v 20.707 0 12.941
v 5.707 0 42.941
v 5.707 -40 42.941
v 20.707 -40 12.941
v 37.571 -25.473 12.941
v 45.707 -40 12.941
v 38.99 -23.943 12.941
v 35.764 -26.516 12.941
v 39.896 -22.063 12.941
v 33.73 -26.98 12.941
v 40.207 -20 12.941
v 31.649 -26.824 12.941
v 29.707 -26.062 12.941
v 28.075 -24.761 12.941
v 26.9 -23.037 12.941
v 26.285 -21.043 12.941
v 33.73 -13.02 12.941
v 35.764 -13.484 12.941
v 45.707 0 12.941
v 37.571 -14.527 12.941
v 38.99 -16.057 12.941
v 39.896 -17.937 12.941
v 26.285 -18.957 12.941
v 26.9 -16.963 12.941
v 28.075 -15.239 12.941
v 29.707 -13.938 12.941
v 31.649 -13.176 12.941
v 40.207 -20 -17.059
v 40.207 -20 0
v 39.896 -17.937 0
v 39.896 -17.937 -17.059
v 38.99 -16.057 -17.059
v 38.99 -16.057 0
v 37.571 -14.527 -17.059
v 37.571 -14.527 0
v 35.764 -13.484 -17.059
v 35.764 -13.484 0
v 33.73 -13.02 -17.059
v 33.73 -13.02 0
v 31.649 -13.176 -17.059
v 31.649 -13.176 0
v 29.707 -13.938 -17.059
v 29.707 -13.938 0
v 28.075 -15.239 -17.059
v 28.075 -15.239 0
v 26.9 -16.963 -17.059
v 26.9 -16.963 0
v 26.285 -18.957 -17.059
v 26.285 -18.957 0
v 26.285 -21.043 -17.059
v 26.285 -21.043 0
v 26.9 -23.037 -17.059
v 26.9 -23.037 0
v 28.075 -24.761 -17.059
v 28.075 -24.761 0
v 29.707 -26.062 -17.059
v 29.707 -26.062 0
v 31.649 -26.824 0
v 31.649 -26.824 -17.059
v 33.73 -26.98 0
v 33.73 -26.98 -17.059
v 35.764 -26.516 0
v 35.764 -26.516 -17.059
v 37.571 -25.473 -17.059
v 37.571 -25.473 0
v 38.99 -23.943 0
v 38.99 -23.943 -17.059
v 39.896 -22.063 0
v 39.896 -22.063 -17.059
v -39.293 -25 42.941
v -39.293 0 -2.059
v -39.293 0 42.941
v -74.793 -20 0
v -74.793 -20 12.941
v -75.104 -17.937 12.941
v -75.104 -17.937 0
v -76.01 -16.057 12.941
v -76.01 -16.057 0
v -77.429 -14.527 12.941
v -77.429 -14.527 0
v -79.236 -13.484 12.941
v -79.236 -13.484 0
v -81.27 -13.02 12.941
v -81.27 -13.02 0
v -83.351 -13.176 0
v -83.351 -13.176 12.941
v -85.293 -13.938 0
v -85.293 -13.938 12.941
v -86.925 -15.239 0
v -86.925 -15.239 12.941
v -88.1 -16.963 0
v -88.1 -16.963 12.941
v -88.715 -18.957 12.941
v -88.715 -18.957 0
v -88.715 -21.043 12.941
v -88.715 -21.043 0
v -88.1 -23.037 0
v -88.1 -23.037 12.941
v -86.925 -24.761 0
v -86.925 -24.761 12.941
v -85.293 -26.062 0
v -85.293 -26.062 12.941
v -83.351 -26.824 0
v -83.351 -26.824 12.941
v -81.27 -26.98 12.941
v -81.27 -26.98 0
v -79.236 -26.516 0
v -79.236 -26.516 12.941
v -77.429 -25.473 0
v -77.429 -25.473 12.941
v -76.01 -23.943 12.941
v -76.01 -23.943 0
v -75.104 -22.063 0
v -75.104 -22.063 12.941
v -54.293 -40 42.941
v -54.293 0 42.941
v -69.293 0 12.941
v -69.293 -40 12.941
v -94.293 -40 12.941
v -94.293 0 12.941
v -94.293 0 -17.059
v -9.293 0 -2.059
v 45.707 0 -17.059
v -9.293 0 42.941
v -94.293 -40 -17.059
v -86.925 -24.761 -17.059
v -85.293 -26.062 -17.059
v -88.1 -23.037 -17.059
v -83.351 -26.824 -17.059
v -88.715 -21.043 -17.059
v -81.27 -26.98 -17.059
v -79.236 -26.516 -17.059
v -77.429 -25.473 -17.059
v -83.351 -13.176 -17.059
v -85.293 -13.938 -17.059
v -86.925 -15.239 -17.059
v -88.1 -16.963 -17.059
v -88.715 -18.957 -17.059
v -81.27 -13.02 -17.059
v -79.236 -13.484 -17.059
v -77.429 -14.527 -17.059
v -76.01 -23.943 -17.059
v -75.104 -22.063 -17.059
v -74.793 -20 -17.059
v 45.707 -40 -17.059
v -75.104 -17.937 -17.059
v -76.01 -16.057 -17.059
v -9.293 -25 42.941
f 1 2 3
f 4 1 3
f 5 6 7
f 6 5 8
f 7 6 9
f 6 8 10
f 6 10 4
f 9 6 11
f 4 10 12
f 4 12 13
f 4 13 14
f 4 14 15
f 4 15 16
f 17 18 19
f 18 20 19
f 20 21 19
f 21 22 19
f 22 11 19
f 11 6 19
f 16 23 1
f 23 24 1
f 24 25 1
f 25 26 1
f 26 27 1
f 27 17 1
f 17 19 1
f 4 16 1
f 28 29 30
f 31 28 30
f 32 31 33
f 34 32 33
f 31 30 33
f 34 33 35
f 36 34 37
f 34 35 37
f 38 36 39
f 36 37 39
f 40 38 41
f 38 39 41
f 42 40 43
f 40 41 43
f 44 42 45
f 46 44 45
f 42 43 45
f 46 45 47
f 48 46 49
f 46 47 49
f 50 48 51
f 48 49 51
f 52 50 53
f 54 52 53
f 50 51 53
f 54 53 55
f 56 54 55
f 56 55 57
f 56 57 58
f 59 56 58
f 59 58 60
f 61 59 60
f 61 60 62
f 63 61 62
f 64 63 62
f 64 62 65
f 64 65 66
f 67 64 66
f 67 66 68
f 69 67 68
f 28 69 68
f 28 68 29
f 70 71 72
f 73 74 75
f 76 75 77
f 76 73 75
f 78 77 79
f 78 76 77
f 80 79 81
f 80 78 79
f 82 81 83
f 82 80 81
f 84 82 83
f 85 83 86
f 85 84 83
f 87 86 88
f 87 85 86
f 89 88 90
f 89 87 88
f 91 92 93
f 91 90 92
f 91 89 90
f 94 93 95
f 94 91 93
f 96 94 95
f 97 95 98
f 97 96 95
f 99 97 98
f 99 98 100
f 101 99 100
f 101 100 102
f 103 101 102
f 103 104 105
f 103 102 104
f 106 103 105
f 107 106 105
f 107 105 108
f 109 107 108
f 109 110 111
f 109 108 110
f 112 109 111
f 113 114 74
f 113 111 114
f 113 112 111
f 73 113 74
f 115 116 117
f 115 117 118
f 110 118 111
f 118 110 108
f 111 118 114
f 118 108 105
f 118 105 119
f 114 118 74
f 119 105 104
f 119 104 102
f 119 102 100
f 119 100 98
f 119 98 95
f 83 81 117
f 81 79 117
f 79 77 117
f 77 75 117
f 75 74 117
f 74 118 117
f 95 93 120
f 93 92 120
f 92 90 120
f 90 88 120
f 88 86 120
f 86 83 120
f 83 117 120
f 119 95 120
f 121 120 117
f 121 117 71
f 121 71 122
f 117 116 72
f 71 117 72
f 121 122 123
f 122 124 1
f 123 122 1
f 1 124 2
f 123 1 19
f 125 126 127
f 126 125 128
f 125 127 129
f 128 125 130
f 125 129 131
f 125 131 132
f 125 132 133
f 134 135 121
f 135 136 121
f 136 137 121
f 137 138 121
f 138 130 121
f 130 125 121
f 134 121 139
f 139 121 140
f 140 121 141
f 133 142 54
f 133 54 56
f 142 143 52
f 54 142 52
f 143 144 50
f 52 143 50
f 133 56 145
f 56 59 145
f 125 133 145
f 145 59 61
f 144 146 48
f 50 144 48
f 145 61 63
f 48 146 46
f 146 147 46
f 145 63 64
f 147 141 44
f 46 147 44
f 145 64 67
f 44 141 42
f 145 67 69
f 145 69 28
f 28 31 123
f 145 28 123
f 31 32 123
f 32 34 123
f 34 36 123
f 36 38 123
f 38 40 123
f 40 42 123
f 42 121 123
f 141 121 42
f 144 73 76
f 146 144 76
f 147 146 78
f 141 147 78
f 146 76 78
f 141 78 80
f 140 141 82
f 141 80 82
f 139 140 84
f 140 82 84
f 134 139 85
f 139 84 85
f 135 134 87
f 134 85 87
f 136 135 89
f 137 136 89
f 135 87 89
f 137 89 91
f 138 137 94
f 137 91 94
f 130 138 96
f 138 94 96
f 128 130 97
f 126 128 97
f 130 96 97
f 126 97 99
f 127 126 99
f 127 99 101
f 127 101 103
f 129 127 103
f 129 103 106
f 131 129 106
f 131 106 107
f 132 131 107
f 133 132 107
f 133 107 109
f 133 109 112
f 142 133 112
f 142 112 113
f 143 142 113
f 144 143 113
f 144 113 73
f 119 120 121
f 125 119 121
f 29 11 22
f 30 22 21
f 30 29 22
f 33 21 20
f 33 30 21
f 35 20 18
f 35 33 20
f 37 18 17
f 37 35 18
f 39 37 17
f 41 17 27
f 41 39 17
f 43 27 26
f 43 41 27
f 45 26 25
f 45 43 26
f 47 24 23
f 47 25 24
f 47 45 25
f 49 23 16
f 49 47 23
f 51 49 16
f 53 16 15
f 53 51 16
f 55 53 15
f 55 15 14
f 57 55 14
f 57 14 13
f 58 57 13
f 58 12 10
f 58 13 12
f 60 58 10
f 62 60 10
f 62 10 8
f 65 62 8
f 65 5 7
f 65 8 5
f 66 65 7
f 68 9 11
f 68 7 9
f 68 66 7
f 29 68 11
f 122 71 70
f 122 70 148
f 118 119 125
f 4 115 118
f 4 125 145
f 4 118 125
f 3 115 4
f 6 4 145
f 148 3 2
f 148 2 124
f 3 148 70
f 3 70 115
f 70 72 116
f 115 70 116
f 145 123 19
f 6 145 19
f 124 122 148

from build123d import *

# Parameters (mm, degrees)
F1_DEPTH      = 40
F2_SIZE2      = 14.99999
F2_SIZE       = 29.99999
F2_2_SIZE2    = 14.99999
F2_2_SIZE     = 29.99999
F3_W          = 30
F3_H          = 45
F4_DEPTH      = 25
F5_SIZE2      = 24.99999
F5_SIZE       = 44.99999
F6_R          = 7
F7_DEPTH      = 15
F7_DEPTH_BACK = 20


# Not quite as in the source:
# - a fillet or chamfer is up to 0.001 mm smaller than in the source, because OpenCascade refuses the exact size


with BuildPart() as f1:
    # F0 (on Front) → F1 (new body)
    with BuildSketch(Plane.XZ):
        Polygon((20.7067526877, 42.941089198), (-69.2932473123, 42.941089198), (-69.2932473123, 12.941089198), (-94.2932473123, 12.941089198), (-94.2932473123, -17.058910802), (45.7067526877, -17.058910802), (45.7067526877, 12.941089198), (20.7067526877, 12.941089198), align=None)
    extrude(amount=F1_DEPTH)

    # F2 (size 30 and 15 in the source; OpenCascade refuses exactly that, so slightly less here)
    f2_edges = [f1.edges().sort_by_distance(p)[0] for p in [
        (-69.293247, -20, 42.941089),
    ]]
    f2_side = f1.faces().sort_by_distance((-69.293247, -20, 27.941089))[0]
    chamfer(f2_edges, length=F2_SIZE, length2=F2_SIZE2, reference=f2_side)

    # F2#2 (size 30 and 15 in the source; OpenCascade refuses exactly that, so slightly less here)
    f2_2_edges = [f1.edges().sort_by_distance(p)[0] for p in [
        (20.706753, -20, 42.941089),
    ]]
    f2_2_side = f1.faces().sort_by_distance((20.706753, -20, 27.941089))[0]
    chamfer(f2_2_edges, length=F2_2_SIZE, length2=F2_2_SIZE2, reference=f2_2_side)

    # F3 (on Front) → F4 (cut)
    with BuildSketch(Plane.XZ):
        with Locations((-24.2932473123, 20.441089198)):
            Rectangle(F3_W, F3_H)
    extrude(amount=F4_DEPTH, mode=Mode.SUBTRACT)

    # F5 (size 45 and 25 in the source; OpenCascade refuses exactly that, so slightly less here)
    f5_edges = [f1.edges().sort_by_distance(p)[0] for p in [
        (-24.293247, -25, -2.058911),
    ]]
    f5_side = f1.faces().sort_by_distance((-24.293247, -25, 20.441089))[0]
    chamfer(f5_edges, length=F5_SIZE, length2=F5_SIZE2, reference=f5_side)

    # F6 (on Top) → F7 (cut, two sides)
    with BuildSketch(Plane.XY) as f7_sk:
        with Locations((-81.7932473123, -20)):
            Circle(F6_R)
        with Locations((33.2067526877, -20)):
            Circle(F6_R)
    extrude(amount=F7_DEPTH, mode=Mode.SUBTRACT)
    extrude(f7_sk.sketch, amount=-F7_DEPTH_BACK, mode=Mode.SUBTRACT)


solid = f1.part
